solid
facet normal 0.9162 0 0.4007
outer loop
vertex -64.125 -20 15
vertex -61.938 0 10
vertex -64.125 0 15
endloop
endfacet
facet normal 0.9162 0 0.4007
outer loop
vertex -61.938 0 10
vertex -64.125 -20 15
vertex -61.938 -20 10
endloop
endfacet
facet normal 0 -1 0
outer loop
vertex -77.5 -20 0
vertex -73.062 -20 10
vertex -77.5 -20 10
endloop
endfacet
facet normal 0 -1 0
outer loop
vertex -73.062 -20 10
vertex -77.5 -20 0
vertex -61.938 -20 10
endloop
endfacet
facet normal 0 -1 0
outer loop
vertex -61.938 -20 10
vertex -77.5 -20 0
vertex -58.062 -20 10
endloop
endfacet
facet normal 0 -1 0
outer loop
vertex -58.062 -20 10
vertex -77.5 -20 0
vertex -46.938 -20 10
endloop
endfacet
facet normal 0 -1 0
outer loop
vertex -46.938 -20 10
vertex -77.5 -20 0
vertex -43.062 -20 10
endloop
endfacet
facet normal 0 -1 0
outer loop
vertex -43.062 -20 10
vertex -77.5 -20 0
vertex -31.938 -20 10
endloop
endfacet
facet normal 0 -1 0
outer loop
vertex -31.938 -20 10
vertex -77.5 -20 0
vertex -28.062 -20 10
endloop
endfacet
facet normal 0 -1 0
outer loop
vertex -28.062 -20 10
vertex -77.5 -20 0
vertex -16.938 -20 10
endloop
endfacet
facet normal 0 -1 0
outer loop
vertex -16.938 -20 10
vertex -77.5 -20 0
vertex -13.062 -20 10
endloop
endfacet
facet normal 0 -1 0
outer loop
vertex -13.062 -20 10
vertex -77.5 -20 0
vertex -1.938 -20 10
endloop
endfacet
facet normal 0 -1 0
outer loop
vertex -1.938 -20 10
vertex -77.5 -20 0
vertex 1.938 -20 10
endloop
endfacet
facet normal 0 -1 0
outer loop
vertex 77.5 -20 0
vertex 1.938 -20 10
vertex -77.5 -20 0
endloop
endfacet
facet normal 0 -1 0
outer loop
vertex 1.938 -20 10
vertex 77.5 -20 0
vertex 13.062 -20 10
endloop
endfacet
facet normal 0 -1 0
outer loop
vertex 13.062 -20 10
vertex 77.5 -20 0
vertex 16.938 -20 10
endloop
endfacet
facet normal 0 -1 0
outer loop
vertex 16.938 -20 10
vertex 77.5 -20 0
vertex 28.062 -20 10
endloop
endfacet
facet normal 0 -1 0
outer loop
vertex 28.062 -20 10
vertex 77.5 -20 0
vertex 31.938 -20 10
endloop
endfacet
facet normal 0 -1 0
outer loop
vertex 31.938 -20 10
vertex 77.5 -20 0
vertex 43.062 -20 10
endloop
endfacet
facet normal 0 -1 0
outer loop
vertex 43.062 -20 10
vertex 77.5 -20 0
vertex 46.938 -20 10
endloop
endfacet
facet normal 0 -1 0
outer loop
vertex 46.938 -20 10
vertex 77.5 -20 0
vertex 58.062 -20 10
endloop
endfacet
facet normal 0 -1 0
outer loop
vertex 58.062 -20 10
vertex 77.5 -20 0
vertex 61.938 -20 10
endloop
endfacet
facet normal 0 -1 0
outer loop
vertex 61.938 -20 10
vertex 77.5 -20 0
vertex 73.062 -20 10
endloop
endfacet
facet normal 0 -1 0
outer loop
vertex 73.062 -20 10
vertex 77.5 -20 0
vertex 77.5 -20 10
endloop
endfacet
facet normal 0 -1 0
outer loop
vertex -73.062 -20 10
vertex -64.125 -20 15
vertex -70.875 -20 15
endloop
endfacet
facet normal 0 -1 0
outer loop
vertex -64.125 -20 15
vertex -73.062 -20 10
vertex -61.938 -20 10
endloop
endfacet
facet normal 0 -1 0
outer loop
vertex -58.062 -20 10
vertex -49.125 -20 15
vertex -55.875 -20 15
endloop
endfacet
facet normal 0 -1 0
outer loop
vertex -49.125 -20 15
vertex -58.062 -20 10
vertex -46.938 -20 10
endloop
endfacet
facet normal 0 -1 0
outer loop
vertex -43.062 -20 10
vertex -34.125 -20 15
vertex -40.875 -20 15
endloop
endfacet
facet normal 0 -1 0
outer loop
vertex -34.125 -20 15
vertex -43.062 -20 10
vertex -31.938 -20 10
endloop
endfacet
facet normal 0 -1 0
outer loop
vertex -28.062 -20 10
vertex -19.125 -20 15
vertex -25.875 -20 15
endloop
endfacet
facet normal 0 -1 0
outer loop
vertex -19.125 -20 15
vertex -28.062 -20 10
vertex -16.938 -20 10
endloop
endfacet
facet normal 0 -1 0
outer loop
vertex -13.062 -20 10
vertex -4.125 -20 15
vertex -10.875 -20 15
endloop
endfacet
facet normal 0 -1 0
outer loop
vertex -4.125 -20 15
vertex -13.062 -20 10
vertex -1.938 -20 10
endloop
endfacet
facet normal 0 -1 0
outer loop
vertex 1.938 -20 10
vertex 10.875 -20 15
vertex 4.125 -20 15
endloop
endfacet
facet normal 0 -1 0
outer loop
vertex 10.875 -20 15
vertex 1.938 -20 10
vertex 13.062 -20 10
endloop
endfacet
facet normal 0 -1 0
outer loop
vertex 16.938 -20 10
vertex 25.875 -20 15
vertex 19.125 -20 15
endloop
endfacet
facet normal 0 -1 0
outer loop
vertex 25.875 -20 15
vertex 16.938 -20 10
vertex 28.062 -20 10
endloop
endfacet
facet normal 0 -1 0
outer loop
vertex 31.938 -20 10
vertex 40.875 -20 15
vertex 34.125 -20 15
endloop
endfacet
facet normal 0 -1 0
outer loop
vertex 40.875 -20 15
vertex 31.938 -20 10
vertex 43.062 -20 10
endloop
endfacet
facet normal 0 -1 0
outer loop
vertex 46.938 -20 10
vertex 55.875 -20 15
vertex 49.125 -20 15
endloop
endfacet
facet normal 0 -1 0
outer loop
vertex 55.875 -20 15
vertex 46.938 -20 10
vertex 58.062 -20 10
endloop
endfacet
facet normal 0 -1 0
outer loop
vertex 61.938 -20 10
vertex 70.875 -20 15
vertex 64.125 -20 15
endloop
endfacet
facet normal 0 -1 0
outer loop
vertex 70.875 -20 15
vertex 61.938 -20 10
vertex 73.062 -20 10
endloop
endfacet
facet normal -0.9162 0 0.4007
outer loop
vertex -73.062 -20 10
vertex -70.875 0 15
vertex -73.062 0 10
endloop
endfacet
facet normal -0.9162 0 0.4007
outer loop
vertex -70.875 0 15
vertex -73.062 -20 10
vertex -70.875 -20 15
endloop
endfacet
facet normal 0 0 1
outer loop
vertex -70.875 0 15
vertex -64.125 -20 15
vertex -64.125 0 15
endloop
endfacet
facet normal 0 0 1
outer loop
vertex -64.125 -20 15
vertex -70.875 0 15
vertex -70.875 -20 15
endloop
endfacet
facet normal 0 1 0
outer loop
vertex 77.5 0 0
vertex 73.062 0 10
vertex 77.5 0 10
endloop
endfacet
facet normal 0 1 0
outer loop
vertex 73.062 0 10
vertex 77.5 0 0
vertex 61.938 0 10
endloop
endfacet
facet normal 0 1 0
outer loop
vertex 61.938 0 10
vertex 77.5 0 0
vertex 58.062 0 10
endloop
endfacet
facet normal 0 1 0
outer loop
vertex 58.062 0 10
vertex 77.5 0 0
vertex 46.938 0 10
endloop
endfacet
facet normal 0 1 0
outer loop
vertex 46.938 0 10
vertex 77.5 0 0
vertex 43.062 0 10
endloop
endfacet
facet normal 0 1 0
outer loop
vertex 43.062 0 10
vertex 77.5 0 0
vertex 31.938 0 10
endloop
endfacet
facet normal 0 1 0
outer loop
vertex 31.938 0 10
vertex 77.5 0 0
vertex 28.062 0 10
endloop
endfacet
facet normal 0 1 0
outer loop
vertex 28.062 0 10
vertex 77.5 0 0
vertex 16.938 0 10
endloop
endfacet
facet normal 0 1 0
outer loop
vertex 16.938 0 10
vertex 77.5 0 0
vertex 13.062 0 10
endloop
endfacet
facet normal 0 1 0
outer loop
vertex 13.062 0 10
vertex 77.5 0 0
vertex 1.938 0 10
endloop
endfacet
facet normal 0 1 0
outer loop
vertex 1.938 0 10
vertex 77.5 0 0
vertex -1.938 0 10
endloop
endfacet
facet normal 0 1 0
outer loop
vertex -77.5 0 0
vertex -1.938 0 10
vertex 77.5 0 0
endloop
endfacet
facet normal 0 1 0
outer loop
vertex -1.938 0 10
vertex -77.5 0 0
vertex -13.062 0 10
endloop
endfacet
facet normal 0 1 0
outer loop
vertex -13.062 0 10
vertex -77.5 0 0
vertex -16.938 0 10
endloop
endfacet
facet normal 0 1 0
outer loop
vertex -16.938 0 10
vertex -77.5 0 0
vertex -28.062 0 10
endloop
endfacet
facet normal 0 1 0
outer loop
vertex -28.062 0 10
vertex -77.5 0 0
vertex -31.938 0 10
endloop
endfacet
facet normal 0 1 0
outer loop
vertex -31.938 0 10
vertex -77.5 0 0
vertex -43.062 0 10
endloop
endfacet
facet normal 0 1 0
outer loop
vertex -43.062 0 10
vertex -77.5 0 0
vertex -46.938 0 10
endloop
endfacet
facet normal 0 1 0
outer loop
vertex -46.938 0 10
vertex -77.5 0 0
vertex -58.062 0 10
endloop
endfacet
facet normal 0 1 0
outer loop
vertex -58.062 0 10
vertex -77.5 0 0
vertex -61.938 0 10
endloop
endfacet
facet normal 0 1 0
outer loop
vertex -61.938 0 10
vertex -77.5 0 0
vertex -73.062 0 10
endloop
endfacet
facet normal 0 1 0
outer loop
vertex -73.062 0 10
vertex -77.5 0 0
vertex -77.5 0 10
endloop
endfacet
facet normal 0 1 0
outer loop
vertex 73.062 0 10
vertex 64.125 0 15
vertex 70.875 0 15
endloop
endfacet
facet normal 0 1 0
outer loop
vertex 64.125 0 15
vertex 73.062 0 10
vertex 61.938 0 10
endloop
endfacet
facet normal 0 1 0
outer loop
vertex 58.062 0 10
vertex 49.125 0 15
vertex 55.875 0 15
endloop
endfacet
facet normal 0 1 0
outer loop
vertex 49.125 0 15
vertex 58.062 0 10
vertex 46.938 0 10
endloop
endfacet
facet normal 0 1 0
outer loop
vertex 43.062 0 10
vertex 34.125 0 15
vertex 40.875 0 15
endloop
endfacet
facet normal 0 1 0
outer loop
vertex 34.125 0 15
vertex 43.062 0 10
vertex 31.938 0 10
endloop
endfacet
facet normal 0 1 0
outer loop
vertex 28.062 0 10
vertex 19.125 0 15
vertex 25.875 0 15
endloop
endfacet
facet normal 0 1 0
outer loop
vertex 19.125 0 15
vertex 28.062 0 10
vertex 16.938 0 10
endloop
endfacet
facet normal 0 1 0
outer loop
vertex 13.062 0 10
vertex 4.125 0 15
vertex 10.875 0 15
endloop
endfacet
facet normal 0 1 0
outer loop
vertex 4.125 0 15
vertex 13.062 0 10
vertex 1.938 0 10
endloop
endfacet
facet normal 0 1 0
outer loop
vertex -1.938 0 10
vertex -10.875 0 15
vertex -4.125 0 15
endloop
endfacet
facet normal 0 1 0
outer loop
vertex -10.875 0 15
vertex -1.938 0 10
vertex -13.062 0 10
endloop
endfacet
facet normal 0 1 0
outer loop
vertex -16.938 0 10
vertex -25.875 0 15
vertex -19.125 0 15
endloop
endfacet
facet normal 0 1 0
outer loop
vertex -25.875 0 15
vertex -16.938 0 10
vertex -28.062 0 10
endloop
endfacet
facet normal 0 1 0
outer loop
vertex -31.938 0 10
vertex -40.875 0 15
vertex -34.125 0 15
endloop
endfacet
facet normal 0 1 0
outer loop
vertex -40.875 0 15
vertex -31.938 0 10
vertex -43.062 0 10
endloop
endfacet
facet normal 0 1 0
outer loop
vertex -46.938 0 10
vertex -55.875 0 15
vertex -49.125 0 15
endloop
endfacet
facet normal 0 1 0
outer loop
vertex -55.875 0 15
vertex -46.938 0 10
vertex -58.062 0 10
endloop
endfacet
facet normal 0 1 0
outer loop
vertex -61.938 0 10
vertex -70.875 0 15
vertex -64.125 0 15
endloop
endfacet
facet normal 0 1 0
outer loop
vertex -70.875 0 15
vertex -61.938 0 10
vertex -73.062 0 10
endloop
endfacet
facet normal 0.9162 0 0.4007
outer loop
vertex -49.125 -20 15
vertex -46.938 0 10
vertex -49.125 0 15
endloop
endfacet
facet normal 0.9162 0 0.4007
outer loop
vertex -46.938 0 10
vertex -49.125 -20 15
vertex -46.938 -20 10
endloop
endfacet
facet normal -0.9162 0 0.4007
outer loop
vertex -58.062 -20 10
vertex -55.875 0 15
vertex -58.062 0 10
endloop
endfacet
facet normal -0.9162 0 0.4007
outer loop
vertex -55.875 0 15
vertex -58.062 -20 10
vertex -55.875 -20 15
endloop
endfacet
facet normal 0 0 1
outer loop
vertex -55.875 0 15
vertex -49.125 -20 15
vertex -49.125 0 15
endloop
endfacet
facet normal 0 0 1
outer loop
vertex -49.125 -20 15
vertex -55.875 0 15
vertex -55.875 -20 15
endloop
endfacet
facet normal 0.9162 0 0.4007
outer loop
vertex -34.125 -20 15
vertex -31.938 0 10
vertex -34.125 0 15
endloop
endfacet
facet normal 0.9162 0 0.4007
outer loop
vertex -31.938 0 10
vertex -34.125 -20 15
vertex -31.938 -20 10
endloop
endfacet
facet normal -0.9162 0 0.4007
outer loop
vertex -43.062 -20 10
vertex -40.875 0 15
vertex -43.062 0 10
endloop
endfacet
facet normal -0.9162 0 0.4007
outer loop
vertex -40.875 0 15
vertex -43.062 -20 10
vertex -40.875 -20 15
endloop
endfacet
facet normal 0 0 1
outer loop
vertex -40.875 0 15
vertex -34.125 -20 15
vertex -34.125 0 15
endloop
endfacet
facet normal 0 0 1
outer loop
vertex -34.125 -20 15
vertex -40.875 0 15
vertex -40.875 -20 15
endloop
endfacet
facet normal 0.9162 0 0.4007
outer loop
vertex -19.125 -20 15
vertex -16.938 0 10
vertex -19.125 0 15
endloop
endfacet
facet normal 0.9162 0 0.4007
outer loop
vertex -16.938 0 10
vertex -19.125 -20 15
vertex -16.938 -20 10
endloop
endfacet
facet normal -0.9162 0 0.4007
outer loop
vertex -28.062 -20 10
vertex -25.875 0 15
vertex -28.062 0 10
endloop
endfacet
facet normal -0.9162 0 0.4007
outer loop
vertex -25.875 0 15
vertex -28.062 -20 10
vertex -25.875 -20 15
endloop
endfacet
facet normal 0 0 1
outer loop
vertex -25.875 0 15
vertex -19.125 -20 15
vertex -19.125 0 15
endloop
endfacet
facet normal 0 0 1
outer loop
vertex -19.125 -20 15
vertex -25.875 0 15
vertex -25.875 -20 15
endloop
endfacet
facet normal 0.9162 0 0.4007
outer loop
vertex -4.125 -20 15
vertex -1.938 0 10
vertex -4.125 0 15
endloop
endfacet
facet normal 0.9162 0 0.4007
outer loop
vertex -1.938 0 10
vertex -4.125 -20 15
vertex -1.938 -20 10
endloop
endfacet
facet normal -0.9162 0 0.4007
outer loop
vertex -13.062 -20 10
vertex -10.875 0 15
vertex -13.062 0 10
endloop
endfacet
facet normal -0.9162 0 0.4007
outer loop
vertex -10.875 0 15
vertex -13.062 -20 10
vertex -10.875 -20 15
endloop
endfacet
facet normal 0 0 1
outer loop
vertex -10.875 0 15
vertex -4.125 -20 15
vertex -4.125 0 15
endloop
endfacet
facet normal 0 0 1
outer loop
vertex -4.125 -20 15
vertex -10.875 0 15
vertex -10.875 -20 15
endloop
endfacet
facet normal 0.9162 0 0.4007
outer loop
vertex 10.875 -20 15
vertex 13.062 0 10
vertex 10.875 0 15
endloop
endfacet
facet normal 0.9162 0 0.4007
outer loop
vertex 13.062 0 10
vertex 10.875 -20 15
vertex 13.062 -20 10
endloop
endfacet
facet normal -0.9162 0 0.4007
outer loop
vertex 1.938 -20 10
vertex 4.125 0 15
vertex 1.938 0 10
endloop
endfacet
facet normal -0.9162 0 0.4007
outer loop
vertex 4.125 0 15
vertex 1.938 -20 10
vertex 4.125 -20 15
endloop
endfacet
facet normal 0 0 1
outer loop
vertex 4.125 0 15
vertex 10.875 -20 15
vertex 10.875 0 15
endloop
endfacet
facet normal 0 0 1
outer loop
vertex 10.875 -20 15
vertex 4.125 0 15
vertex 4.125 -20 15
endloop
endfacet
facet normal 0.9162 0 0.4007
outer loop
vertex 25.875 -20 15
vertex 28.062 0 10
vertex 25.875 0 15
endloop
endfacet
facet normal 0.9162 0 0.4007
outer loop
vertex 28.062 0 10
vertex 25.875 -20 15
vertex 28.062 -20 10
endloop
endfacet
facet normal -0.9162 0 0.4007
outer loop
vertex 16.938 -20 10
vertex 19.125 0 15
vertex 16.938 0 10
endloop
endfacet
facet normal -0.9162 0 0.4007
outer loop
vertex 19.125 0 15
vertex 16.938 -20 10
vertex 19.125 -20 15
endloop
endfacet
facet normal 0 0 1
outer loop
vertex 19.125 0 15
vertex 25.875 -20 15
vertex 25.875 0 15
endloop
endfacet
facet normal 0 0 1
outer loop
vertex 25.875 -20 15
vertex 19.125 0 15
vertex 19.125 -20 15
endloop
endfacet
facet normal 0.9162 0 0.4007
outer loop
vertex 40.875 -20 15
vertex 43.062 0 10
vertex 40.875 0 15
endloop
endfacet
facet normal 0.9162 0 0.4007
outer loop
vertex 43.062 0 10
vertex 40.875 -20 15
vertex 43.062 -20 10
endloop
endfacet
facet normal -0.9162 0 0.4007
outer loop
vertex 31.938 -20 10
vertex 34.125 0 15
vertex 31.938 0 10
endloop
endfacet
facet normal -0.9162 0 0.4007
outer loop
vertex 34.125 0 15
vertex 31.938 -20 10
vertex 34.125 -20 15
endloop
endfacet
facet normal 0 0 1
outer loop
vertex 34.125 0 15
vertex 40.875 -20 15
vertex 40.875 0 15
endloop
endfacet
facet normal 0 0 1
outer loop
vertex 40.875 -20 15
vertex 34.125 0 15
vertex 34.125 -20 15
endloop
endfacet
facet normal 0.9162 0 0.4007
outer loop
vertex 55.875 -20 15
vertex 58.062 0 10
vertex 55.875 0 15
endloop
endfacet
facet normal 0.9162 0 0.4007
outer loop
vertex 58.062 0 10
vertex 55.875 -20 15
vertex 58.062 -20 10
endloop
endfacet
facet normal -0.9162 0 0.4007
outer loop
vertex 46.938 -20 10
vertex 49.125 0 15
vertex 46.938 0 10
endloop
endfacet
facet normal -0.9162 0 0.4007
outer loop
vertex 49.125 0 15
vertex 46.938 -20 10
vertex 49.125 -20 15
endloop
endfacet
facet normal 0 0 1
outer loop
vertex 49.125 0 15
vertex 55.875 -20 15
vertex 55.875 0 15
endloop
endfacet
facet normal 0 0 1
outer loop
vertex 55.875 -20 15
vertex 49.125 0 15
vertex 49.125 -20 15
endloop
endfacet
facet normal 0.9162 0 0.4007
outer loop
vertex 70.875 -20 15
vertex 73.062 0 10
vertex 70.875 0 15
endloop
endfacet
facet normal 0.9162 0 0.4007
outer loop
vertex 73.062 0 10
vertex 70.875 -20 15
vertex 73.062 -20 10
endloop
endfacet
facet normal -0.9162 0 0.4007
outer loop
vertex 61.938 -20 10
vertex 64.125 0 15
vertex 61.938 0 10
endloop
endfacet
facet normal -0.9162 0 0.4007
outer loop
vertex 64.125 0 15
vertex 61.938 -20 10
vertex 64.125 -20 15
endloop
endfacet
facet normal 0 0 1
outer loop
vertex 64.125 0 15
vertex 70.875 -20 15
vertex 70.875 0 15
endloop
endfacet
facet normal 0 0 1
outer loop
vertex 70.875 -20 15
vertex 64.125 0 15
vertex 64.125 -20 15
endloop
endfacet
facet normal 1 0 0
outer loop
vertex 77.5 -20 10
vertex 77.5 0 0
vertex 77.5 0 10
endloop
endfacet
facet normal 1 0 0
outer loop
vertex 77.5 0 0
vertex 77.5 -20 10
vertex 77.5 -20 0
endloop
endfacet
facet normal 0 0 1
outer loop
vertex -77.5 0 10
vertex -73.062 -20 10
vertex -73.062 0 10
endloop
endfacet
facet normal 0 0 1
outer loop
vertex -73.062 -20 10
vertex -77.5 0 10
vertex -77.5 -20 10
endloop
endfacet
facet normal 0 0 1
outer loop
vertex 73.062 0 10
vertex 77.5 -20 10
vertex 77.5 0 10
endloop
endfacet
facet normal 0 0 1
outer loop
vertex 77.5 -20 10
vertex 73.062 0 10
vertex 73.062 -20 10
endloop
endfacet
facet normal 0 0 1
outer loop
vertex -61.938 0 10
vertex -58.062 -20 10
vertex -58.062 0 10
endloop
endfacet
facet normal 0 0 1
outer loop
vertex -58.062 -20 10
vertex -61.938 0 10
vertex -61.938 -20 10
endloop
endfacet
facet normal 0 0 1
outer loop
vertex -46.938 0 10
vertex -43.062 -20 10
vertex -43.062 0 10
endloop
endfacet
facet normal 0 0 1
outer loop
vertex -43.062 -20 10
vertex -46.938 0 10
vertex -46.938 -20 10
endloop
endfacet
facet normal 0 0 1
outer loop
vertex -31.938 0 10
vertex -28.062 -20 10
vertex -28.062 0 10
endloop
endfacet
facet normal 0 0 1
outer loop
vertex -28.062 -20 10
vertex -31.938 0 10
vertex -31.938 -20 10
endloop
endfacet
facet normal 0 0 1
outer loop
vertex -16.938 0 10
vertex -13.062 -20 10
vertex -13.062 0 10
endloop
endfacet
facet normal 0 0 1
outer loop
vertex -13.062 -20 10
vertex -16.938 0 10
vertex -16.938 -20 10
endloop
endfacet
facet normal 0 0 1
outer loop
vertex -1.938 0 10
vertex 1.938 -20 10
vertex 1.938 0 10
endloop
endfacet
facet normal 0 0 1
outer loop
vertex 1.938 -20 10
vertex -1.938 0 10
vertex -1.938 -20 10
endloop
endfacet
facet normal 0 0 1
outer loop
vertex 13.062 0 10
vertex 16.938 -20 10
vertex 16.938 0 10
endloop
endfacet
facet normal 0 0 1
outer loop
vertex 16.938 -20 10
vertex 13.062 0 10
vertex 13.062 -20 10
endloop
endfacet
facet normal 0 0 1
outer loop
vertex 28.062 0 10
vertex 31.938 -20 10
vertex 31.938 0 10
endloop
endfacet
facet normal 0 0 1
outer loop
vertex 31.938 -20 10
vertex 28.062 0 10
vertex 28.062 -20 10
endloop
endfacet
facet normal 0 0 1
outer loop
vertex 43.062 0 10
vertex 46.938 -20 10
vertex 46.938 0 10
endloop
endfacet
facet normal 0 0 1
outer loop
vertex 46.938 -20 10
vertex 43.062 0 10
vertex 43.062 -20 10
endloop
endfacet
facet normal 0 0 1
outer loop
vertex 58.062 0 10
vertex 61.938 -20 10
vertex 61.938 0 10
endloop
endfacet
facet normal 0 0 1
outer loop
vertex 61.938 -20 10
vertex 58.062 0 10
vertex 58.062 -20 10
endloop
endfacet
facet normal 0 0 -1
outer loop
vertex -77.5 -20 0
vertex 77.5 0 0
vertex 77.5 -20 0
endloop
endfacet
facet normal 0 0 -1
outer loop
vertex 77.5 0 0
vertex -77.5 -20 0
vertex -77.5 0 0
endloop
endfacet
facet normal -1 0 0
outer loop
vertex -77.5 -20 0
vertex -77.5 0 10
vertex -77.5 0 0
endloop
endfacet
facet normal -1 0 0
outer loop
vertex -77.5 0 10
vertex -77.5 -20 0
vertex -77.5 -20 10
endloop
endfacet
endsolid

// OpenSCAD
$fn = 32;

// ----------------------------------------------------------------------
// Toothed rack, 10 teeth
// 15 mm pitch, 5 mm teeth
// ----------------------------------------------------------------------

// --- parameters (mm) ---
bar_w = 20;      // bar width (Y)
bar_h = 10;      // bar height (Z)
teeth = 10;      // number of teeth
pitch = 15;      // tooth pitch
tooth_h = 5;     // tooth height above the bar
root_w = 12;     // tooth width at the root
crest_w = 6.75;  // tooth width at the crest

// --- derived feature positions (mm) ---
span = (teeth - 1) * pitch;  // = 135   distance between the outer teeth
bar_l = span + root_w + 8;   // = 155   bar length: teeth plus 4 mm at each end
tooth_x = -span / 2;         // = -67.5   X of the first tooth
height = bar_h + tooth_h;    // = 15   overall height
feature_centers = [
  [tooth_x + 0 * pitch, -bar_w / 2],
  [tooth_x + 1 * pitch, -bar_w / 2],
  [tooth_x + 2 * pitch, -bar_w / 2],
  [tooth_x + 3 * pitch, -bar_w / 2],
  [tooth_x + 4 * pitch, -bar_w / 2],
  [tooth_x + 5 * pitch, -bar_w / 2],
  [tooth_x + 6 * pitch, -bar_w / 2],
  [tooth_x + 7 * pitch, -bar_w / 2],
  [tooth_x + 8 * pitch, -bar_w / 2],
  [tooth_x + 9 * pitch, -bar_w / 2]
];   // tooth centre line, drives the tooth loop

// bar with a rack of teeth, one extruded trapezoium per centre
module rack_tooth() {
  linear_extrude(height = bar_w)
    polygon(points = [
      [0, 0],
      [root_w, 0],
      [root_w / 2 + crest_w / 2, tooth_h + 1],
      [root_w / 2 - crest_w / 2, tooth_h + 1]
    ]);
}

union() {
  translate([-bar_l / 2, -bar_w, 0]) cube([bar_l, bar_w, bar_h]);
  for (centre = feature_centers)
    translate([centre[0] - root_w / 2, 0, bar_h - 1]) rotate([90, 0, 0]) rack_tooth();
}
